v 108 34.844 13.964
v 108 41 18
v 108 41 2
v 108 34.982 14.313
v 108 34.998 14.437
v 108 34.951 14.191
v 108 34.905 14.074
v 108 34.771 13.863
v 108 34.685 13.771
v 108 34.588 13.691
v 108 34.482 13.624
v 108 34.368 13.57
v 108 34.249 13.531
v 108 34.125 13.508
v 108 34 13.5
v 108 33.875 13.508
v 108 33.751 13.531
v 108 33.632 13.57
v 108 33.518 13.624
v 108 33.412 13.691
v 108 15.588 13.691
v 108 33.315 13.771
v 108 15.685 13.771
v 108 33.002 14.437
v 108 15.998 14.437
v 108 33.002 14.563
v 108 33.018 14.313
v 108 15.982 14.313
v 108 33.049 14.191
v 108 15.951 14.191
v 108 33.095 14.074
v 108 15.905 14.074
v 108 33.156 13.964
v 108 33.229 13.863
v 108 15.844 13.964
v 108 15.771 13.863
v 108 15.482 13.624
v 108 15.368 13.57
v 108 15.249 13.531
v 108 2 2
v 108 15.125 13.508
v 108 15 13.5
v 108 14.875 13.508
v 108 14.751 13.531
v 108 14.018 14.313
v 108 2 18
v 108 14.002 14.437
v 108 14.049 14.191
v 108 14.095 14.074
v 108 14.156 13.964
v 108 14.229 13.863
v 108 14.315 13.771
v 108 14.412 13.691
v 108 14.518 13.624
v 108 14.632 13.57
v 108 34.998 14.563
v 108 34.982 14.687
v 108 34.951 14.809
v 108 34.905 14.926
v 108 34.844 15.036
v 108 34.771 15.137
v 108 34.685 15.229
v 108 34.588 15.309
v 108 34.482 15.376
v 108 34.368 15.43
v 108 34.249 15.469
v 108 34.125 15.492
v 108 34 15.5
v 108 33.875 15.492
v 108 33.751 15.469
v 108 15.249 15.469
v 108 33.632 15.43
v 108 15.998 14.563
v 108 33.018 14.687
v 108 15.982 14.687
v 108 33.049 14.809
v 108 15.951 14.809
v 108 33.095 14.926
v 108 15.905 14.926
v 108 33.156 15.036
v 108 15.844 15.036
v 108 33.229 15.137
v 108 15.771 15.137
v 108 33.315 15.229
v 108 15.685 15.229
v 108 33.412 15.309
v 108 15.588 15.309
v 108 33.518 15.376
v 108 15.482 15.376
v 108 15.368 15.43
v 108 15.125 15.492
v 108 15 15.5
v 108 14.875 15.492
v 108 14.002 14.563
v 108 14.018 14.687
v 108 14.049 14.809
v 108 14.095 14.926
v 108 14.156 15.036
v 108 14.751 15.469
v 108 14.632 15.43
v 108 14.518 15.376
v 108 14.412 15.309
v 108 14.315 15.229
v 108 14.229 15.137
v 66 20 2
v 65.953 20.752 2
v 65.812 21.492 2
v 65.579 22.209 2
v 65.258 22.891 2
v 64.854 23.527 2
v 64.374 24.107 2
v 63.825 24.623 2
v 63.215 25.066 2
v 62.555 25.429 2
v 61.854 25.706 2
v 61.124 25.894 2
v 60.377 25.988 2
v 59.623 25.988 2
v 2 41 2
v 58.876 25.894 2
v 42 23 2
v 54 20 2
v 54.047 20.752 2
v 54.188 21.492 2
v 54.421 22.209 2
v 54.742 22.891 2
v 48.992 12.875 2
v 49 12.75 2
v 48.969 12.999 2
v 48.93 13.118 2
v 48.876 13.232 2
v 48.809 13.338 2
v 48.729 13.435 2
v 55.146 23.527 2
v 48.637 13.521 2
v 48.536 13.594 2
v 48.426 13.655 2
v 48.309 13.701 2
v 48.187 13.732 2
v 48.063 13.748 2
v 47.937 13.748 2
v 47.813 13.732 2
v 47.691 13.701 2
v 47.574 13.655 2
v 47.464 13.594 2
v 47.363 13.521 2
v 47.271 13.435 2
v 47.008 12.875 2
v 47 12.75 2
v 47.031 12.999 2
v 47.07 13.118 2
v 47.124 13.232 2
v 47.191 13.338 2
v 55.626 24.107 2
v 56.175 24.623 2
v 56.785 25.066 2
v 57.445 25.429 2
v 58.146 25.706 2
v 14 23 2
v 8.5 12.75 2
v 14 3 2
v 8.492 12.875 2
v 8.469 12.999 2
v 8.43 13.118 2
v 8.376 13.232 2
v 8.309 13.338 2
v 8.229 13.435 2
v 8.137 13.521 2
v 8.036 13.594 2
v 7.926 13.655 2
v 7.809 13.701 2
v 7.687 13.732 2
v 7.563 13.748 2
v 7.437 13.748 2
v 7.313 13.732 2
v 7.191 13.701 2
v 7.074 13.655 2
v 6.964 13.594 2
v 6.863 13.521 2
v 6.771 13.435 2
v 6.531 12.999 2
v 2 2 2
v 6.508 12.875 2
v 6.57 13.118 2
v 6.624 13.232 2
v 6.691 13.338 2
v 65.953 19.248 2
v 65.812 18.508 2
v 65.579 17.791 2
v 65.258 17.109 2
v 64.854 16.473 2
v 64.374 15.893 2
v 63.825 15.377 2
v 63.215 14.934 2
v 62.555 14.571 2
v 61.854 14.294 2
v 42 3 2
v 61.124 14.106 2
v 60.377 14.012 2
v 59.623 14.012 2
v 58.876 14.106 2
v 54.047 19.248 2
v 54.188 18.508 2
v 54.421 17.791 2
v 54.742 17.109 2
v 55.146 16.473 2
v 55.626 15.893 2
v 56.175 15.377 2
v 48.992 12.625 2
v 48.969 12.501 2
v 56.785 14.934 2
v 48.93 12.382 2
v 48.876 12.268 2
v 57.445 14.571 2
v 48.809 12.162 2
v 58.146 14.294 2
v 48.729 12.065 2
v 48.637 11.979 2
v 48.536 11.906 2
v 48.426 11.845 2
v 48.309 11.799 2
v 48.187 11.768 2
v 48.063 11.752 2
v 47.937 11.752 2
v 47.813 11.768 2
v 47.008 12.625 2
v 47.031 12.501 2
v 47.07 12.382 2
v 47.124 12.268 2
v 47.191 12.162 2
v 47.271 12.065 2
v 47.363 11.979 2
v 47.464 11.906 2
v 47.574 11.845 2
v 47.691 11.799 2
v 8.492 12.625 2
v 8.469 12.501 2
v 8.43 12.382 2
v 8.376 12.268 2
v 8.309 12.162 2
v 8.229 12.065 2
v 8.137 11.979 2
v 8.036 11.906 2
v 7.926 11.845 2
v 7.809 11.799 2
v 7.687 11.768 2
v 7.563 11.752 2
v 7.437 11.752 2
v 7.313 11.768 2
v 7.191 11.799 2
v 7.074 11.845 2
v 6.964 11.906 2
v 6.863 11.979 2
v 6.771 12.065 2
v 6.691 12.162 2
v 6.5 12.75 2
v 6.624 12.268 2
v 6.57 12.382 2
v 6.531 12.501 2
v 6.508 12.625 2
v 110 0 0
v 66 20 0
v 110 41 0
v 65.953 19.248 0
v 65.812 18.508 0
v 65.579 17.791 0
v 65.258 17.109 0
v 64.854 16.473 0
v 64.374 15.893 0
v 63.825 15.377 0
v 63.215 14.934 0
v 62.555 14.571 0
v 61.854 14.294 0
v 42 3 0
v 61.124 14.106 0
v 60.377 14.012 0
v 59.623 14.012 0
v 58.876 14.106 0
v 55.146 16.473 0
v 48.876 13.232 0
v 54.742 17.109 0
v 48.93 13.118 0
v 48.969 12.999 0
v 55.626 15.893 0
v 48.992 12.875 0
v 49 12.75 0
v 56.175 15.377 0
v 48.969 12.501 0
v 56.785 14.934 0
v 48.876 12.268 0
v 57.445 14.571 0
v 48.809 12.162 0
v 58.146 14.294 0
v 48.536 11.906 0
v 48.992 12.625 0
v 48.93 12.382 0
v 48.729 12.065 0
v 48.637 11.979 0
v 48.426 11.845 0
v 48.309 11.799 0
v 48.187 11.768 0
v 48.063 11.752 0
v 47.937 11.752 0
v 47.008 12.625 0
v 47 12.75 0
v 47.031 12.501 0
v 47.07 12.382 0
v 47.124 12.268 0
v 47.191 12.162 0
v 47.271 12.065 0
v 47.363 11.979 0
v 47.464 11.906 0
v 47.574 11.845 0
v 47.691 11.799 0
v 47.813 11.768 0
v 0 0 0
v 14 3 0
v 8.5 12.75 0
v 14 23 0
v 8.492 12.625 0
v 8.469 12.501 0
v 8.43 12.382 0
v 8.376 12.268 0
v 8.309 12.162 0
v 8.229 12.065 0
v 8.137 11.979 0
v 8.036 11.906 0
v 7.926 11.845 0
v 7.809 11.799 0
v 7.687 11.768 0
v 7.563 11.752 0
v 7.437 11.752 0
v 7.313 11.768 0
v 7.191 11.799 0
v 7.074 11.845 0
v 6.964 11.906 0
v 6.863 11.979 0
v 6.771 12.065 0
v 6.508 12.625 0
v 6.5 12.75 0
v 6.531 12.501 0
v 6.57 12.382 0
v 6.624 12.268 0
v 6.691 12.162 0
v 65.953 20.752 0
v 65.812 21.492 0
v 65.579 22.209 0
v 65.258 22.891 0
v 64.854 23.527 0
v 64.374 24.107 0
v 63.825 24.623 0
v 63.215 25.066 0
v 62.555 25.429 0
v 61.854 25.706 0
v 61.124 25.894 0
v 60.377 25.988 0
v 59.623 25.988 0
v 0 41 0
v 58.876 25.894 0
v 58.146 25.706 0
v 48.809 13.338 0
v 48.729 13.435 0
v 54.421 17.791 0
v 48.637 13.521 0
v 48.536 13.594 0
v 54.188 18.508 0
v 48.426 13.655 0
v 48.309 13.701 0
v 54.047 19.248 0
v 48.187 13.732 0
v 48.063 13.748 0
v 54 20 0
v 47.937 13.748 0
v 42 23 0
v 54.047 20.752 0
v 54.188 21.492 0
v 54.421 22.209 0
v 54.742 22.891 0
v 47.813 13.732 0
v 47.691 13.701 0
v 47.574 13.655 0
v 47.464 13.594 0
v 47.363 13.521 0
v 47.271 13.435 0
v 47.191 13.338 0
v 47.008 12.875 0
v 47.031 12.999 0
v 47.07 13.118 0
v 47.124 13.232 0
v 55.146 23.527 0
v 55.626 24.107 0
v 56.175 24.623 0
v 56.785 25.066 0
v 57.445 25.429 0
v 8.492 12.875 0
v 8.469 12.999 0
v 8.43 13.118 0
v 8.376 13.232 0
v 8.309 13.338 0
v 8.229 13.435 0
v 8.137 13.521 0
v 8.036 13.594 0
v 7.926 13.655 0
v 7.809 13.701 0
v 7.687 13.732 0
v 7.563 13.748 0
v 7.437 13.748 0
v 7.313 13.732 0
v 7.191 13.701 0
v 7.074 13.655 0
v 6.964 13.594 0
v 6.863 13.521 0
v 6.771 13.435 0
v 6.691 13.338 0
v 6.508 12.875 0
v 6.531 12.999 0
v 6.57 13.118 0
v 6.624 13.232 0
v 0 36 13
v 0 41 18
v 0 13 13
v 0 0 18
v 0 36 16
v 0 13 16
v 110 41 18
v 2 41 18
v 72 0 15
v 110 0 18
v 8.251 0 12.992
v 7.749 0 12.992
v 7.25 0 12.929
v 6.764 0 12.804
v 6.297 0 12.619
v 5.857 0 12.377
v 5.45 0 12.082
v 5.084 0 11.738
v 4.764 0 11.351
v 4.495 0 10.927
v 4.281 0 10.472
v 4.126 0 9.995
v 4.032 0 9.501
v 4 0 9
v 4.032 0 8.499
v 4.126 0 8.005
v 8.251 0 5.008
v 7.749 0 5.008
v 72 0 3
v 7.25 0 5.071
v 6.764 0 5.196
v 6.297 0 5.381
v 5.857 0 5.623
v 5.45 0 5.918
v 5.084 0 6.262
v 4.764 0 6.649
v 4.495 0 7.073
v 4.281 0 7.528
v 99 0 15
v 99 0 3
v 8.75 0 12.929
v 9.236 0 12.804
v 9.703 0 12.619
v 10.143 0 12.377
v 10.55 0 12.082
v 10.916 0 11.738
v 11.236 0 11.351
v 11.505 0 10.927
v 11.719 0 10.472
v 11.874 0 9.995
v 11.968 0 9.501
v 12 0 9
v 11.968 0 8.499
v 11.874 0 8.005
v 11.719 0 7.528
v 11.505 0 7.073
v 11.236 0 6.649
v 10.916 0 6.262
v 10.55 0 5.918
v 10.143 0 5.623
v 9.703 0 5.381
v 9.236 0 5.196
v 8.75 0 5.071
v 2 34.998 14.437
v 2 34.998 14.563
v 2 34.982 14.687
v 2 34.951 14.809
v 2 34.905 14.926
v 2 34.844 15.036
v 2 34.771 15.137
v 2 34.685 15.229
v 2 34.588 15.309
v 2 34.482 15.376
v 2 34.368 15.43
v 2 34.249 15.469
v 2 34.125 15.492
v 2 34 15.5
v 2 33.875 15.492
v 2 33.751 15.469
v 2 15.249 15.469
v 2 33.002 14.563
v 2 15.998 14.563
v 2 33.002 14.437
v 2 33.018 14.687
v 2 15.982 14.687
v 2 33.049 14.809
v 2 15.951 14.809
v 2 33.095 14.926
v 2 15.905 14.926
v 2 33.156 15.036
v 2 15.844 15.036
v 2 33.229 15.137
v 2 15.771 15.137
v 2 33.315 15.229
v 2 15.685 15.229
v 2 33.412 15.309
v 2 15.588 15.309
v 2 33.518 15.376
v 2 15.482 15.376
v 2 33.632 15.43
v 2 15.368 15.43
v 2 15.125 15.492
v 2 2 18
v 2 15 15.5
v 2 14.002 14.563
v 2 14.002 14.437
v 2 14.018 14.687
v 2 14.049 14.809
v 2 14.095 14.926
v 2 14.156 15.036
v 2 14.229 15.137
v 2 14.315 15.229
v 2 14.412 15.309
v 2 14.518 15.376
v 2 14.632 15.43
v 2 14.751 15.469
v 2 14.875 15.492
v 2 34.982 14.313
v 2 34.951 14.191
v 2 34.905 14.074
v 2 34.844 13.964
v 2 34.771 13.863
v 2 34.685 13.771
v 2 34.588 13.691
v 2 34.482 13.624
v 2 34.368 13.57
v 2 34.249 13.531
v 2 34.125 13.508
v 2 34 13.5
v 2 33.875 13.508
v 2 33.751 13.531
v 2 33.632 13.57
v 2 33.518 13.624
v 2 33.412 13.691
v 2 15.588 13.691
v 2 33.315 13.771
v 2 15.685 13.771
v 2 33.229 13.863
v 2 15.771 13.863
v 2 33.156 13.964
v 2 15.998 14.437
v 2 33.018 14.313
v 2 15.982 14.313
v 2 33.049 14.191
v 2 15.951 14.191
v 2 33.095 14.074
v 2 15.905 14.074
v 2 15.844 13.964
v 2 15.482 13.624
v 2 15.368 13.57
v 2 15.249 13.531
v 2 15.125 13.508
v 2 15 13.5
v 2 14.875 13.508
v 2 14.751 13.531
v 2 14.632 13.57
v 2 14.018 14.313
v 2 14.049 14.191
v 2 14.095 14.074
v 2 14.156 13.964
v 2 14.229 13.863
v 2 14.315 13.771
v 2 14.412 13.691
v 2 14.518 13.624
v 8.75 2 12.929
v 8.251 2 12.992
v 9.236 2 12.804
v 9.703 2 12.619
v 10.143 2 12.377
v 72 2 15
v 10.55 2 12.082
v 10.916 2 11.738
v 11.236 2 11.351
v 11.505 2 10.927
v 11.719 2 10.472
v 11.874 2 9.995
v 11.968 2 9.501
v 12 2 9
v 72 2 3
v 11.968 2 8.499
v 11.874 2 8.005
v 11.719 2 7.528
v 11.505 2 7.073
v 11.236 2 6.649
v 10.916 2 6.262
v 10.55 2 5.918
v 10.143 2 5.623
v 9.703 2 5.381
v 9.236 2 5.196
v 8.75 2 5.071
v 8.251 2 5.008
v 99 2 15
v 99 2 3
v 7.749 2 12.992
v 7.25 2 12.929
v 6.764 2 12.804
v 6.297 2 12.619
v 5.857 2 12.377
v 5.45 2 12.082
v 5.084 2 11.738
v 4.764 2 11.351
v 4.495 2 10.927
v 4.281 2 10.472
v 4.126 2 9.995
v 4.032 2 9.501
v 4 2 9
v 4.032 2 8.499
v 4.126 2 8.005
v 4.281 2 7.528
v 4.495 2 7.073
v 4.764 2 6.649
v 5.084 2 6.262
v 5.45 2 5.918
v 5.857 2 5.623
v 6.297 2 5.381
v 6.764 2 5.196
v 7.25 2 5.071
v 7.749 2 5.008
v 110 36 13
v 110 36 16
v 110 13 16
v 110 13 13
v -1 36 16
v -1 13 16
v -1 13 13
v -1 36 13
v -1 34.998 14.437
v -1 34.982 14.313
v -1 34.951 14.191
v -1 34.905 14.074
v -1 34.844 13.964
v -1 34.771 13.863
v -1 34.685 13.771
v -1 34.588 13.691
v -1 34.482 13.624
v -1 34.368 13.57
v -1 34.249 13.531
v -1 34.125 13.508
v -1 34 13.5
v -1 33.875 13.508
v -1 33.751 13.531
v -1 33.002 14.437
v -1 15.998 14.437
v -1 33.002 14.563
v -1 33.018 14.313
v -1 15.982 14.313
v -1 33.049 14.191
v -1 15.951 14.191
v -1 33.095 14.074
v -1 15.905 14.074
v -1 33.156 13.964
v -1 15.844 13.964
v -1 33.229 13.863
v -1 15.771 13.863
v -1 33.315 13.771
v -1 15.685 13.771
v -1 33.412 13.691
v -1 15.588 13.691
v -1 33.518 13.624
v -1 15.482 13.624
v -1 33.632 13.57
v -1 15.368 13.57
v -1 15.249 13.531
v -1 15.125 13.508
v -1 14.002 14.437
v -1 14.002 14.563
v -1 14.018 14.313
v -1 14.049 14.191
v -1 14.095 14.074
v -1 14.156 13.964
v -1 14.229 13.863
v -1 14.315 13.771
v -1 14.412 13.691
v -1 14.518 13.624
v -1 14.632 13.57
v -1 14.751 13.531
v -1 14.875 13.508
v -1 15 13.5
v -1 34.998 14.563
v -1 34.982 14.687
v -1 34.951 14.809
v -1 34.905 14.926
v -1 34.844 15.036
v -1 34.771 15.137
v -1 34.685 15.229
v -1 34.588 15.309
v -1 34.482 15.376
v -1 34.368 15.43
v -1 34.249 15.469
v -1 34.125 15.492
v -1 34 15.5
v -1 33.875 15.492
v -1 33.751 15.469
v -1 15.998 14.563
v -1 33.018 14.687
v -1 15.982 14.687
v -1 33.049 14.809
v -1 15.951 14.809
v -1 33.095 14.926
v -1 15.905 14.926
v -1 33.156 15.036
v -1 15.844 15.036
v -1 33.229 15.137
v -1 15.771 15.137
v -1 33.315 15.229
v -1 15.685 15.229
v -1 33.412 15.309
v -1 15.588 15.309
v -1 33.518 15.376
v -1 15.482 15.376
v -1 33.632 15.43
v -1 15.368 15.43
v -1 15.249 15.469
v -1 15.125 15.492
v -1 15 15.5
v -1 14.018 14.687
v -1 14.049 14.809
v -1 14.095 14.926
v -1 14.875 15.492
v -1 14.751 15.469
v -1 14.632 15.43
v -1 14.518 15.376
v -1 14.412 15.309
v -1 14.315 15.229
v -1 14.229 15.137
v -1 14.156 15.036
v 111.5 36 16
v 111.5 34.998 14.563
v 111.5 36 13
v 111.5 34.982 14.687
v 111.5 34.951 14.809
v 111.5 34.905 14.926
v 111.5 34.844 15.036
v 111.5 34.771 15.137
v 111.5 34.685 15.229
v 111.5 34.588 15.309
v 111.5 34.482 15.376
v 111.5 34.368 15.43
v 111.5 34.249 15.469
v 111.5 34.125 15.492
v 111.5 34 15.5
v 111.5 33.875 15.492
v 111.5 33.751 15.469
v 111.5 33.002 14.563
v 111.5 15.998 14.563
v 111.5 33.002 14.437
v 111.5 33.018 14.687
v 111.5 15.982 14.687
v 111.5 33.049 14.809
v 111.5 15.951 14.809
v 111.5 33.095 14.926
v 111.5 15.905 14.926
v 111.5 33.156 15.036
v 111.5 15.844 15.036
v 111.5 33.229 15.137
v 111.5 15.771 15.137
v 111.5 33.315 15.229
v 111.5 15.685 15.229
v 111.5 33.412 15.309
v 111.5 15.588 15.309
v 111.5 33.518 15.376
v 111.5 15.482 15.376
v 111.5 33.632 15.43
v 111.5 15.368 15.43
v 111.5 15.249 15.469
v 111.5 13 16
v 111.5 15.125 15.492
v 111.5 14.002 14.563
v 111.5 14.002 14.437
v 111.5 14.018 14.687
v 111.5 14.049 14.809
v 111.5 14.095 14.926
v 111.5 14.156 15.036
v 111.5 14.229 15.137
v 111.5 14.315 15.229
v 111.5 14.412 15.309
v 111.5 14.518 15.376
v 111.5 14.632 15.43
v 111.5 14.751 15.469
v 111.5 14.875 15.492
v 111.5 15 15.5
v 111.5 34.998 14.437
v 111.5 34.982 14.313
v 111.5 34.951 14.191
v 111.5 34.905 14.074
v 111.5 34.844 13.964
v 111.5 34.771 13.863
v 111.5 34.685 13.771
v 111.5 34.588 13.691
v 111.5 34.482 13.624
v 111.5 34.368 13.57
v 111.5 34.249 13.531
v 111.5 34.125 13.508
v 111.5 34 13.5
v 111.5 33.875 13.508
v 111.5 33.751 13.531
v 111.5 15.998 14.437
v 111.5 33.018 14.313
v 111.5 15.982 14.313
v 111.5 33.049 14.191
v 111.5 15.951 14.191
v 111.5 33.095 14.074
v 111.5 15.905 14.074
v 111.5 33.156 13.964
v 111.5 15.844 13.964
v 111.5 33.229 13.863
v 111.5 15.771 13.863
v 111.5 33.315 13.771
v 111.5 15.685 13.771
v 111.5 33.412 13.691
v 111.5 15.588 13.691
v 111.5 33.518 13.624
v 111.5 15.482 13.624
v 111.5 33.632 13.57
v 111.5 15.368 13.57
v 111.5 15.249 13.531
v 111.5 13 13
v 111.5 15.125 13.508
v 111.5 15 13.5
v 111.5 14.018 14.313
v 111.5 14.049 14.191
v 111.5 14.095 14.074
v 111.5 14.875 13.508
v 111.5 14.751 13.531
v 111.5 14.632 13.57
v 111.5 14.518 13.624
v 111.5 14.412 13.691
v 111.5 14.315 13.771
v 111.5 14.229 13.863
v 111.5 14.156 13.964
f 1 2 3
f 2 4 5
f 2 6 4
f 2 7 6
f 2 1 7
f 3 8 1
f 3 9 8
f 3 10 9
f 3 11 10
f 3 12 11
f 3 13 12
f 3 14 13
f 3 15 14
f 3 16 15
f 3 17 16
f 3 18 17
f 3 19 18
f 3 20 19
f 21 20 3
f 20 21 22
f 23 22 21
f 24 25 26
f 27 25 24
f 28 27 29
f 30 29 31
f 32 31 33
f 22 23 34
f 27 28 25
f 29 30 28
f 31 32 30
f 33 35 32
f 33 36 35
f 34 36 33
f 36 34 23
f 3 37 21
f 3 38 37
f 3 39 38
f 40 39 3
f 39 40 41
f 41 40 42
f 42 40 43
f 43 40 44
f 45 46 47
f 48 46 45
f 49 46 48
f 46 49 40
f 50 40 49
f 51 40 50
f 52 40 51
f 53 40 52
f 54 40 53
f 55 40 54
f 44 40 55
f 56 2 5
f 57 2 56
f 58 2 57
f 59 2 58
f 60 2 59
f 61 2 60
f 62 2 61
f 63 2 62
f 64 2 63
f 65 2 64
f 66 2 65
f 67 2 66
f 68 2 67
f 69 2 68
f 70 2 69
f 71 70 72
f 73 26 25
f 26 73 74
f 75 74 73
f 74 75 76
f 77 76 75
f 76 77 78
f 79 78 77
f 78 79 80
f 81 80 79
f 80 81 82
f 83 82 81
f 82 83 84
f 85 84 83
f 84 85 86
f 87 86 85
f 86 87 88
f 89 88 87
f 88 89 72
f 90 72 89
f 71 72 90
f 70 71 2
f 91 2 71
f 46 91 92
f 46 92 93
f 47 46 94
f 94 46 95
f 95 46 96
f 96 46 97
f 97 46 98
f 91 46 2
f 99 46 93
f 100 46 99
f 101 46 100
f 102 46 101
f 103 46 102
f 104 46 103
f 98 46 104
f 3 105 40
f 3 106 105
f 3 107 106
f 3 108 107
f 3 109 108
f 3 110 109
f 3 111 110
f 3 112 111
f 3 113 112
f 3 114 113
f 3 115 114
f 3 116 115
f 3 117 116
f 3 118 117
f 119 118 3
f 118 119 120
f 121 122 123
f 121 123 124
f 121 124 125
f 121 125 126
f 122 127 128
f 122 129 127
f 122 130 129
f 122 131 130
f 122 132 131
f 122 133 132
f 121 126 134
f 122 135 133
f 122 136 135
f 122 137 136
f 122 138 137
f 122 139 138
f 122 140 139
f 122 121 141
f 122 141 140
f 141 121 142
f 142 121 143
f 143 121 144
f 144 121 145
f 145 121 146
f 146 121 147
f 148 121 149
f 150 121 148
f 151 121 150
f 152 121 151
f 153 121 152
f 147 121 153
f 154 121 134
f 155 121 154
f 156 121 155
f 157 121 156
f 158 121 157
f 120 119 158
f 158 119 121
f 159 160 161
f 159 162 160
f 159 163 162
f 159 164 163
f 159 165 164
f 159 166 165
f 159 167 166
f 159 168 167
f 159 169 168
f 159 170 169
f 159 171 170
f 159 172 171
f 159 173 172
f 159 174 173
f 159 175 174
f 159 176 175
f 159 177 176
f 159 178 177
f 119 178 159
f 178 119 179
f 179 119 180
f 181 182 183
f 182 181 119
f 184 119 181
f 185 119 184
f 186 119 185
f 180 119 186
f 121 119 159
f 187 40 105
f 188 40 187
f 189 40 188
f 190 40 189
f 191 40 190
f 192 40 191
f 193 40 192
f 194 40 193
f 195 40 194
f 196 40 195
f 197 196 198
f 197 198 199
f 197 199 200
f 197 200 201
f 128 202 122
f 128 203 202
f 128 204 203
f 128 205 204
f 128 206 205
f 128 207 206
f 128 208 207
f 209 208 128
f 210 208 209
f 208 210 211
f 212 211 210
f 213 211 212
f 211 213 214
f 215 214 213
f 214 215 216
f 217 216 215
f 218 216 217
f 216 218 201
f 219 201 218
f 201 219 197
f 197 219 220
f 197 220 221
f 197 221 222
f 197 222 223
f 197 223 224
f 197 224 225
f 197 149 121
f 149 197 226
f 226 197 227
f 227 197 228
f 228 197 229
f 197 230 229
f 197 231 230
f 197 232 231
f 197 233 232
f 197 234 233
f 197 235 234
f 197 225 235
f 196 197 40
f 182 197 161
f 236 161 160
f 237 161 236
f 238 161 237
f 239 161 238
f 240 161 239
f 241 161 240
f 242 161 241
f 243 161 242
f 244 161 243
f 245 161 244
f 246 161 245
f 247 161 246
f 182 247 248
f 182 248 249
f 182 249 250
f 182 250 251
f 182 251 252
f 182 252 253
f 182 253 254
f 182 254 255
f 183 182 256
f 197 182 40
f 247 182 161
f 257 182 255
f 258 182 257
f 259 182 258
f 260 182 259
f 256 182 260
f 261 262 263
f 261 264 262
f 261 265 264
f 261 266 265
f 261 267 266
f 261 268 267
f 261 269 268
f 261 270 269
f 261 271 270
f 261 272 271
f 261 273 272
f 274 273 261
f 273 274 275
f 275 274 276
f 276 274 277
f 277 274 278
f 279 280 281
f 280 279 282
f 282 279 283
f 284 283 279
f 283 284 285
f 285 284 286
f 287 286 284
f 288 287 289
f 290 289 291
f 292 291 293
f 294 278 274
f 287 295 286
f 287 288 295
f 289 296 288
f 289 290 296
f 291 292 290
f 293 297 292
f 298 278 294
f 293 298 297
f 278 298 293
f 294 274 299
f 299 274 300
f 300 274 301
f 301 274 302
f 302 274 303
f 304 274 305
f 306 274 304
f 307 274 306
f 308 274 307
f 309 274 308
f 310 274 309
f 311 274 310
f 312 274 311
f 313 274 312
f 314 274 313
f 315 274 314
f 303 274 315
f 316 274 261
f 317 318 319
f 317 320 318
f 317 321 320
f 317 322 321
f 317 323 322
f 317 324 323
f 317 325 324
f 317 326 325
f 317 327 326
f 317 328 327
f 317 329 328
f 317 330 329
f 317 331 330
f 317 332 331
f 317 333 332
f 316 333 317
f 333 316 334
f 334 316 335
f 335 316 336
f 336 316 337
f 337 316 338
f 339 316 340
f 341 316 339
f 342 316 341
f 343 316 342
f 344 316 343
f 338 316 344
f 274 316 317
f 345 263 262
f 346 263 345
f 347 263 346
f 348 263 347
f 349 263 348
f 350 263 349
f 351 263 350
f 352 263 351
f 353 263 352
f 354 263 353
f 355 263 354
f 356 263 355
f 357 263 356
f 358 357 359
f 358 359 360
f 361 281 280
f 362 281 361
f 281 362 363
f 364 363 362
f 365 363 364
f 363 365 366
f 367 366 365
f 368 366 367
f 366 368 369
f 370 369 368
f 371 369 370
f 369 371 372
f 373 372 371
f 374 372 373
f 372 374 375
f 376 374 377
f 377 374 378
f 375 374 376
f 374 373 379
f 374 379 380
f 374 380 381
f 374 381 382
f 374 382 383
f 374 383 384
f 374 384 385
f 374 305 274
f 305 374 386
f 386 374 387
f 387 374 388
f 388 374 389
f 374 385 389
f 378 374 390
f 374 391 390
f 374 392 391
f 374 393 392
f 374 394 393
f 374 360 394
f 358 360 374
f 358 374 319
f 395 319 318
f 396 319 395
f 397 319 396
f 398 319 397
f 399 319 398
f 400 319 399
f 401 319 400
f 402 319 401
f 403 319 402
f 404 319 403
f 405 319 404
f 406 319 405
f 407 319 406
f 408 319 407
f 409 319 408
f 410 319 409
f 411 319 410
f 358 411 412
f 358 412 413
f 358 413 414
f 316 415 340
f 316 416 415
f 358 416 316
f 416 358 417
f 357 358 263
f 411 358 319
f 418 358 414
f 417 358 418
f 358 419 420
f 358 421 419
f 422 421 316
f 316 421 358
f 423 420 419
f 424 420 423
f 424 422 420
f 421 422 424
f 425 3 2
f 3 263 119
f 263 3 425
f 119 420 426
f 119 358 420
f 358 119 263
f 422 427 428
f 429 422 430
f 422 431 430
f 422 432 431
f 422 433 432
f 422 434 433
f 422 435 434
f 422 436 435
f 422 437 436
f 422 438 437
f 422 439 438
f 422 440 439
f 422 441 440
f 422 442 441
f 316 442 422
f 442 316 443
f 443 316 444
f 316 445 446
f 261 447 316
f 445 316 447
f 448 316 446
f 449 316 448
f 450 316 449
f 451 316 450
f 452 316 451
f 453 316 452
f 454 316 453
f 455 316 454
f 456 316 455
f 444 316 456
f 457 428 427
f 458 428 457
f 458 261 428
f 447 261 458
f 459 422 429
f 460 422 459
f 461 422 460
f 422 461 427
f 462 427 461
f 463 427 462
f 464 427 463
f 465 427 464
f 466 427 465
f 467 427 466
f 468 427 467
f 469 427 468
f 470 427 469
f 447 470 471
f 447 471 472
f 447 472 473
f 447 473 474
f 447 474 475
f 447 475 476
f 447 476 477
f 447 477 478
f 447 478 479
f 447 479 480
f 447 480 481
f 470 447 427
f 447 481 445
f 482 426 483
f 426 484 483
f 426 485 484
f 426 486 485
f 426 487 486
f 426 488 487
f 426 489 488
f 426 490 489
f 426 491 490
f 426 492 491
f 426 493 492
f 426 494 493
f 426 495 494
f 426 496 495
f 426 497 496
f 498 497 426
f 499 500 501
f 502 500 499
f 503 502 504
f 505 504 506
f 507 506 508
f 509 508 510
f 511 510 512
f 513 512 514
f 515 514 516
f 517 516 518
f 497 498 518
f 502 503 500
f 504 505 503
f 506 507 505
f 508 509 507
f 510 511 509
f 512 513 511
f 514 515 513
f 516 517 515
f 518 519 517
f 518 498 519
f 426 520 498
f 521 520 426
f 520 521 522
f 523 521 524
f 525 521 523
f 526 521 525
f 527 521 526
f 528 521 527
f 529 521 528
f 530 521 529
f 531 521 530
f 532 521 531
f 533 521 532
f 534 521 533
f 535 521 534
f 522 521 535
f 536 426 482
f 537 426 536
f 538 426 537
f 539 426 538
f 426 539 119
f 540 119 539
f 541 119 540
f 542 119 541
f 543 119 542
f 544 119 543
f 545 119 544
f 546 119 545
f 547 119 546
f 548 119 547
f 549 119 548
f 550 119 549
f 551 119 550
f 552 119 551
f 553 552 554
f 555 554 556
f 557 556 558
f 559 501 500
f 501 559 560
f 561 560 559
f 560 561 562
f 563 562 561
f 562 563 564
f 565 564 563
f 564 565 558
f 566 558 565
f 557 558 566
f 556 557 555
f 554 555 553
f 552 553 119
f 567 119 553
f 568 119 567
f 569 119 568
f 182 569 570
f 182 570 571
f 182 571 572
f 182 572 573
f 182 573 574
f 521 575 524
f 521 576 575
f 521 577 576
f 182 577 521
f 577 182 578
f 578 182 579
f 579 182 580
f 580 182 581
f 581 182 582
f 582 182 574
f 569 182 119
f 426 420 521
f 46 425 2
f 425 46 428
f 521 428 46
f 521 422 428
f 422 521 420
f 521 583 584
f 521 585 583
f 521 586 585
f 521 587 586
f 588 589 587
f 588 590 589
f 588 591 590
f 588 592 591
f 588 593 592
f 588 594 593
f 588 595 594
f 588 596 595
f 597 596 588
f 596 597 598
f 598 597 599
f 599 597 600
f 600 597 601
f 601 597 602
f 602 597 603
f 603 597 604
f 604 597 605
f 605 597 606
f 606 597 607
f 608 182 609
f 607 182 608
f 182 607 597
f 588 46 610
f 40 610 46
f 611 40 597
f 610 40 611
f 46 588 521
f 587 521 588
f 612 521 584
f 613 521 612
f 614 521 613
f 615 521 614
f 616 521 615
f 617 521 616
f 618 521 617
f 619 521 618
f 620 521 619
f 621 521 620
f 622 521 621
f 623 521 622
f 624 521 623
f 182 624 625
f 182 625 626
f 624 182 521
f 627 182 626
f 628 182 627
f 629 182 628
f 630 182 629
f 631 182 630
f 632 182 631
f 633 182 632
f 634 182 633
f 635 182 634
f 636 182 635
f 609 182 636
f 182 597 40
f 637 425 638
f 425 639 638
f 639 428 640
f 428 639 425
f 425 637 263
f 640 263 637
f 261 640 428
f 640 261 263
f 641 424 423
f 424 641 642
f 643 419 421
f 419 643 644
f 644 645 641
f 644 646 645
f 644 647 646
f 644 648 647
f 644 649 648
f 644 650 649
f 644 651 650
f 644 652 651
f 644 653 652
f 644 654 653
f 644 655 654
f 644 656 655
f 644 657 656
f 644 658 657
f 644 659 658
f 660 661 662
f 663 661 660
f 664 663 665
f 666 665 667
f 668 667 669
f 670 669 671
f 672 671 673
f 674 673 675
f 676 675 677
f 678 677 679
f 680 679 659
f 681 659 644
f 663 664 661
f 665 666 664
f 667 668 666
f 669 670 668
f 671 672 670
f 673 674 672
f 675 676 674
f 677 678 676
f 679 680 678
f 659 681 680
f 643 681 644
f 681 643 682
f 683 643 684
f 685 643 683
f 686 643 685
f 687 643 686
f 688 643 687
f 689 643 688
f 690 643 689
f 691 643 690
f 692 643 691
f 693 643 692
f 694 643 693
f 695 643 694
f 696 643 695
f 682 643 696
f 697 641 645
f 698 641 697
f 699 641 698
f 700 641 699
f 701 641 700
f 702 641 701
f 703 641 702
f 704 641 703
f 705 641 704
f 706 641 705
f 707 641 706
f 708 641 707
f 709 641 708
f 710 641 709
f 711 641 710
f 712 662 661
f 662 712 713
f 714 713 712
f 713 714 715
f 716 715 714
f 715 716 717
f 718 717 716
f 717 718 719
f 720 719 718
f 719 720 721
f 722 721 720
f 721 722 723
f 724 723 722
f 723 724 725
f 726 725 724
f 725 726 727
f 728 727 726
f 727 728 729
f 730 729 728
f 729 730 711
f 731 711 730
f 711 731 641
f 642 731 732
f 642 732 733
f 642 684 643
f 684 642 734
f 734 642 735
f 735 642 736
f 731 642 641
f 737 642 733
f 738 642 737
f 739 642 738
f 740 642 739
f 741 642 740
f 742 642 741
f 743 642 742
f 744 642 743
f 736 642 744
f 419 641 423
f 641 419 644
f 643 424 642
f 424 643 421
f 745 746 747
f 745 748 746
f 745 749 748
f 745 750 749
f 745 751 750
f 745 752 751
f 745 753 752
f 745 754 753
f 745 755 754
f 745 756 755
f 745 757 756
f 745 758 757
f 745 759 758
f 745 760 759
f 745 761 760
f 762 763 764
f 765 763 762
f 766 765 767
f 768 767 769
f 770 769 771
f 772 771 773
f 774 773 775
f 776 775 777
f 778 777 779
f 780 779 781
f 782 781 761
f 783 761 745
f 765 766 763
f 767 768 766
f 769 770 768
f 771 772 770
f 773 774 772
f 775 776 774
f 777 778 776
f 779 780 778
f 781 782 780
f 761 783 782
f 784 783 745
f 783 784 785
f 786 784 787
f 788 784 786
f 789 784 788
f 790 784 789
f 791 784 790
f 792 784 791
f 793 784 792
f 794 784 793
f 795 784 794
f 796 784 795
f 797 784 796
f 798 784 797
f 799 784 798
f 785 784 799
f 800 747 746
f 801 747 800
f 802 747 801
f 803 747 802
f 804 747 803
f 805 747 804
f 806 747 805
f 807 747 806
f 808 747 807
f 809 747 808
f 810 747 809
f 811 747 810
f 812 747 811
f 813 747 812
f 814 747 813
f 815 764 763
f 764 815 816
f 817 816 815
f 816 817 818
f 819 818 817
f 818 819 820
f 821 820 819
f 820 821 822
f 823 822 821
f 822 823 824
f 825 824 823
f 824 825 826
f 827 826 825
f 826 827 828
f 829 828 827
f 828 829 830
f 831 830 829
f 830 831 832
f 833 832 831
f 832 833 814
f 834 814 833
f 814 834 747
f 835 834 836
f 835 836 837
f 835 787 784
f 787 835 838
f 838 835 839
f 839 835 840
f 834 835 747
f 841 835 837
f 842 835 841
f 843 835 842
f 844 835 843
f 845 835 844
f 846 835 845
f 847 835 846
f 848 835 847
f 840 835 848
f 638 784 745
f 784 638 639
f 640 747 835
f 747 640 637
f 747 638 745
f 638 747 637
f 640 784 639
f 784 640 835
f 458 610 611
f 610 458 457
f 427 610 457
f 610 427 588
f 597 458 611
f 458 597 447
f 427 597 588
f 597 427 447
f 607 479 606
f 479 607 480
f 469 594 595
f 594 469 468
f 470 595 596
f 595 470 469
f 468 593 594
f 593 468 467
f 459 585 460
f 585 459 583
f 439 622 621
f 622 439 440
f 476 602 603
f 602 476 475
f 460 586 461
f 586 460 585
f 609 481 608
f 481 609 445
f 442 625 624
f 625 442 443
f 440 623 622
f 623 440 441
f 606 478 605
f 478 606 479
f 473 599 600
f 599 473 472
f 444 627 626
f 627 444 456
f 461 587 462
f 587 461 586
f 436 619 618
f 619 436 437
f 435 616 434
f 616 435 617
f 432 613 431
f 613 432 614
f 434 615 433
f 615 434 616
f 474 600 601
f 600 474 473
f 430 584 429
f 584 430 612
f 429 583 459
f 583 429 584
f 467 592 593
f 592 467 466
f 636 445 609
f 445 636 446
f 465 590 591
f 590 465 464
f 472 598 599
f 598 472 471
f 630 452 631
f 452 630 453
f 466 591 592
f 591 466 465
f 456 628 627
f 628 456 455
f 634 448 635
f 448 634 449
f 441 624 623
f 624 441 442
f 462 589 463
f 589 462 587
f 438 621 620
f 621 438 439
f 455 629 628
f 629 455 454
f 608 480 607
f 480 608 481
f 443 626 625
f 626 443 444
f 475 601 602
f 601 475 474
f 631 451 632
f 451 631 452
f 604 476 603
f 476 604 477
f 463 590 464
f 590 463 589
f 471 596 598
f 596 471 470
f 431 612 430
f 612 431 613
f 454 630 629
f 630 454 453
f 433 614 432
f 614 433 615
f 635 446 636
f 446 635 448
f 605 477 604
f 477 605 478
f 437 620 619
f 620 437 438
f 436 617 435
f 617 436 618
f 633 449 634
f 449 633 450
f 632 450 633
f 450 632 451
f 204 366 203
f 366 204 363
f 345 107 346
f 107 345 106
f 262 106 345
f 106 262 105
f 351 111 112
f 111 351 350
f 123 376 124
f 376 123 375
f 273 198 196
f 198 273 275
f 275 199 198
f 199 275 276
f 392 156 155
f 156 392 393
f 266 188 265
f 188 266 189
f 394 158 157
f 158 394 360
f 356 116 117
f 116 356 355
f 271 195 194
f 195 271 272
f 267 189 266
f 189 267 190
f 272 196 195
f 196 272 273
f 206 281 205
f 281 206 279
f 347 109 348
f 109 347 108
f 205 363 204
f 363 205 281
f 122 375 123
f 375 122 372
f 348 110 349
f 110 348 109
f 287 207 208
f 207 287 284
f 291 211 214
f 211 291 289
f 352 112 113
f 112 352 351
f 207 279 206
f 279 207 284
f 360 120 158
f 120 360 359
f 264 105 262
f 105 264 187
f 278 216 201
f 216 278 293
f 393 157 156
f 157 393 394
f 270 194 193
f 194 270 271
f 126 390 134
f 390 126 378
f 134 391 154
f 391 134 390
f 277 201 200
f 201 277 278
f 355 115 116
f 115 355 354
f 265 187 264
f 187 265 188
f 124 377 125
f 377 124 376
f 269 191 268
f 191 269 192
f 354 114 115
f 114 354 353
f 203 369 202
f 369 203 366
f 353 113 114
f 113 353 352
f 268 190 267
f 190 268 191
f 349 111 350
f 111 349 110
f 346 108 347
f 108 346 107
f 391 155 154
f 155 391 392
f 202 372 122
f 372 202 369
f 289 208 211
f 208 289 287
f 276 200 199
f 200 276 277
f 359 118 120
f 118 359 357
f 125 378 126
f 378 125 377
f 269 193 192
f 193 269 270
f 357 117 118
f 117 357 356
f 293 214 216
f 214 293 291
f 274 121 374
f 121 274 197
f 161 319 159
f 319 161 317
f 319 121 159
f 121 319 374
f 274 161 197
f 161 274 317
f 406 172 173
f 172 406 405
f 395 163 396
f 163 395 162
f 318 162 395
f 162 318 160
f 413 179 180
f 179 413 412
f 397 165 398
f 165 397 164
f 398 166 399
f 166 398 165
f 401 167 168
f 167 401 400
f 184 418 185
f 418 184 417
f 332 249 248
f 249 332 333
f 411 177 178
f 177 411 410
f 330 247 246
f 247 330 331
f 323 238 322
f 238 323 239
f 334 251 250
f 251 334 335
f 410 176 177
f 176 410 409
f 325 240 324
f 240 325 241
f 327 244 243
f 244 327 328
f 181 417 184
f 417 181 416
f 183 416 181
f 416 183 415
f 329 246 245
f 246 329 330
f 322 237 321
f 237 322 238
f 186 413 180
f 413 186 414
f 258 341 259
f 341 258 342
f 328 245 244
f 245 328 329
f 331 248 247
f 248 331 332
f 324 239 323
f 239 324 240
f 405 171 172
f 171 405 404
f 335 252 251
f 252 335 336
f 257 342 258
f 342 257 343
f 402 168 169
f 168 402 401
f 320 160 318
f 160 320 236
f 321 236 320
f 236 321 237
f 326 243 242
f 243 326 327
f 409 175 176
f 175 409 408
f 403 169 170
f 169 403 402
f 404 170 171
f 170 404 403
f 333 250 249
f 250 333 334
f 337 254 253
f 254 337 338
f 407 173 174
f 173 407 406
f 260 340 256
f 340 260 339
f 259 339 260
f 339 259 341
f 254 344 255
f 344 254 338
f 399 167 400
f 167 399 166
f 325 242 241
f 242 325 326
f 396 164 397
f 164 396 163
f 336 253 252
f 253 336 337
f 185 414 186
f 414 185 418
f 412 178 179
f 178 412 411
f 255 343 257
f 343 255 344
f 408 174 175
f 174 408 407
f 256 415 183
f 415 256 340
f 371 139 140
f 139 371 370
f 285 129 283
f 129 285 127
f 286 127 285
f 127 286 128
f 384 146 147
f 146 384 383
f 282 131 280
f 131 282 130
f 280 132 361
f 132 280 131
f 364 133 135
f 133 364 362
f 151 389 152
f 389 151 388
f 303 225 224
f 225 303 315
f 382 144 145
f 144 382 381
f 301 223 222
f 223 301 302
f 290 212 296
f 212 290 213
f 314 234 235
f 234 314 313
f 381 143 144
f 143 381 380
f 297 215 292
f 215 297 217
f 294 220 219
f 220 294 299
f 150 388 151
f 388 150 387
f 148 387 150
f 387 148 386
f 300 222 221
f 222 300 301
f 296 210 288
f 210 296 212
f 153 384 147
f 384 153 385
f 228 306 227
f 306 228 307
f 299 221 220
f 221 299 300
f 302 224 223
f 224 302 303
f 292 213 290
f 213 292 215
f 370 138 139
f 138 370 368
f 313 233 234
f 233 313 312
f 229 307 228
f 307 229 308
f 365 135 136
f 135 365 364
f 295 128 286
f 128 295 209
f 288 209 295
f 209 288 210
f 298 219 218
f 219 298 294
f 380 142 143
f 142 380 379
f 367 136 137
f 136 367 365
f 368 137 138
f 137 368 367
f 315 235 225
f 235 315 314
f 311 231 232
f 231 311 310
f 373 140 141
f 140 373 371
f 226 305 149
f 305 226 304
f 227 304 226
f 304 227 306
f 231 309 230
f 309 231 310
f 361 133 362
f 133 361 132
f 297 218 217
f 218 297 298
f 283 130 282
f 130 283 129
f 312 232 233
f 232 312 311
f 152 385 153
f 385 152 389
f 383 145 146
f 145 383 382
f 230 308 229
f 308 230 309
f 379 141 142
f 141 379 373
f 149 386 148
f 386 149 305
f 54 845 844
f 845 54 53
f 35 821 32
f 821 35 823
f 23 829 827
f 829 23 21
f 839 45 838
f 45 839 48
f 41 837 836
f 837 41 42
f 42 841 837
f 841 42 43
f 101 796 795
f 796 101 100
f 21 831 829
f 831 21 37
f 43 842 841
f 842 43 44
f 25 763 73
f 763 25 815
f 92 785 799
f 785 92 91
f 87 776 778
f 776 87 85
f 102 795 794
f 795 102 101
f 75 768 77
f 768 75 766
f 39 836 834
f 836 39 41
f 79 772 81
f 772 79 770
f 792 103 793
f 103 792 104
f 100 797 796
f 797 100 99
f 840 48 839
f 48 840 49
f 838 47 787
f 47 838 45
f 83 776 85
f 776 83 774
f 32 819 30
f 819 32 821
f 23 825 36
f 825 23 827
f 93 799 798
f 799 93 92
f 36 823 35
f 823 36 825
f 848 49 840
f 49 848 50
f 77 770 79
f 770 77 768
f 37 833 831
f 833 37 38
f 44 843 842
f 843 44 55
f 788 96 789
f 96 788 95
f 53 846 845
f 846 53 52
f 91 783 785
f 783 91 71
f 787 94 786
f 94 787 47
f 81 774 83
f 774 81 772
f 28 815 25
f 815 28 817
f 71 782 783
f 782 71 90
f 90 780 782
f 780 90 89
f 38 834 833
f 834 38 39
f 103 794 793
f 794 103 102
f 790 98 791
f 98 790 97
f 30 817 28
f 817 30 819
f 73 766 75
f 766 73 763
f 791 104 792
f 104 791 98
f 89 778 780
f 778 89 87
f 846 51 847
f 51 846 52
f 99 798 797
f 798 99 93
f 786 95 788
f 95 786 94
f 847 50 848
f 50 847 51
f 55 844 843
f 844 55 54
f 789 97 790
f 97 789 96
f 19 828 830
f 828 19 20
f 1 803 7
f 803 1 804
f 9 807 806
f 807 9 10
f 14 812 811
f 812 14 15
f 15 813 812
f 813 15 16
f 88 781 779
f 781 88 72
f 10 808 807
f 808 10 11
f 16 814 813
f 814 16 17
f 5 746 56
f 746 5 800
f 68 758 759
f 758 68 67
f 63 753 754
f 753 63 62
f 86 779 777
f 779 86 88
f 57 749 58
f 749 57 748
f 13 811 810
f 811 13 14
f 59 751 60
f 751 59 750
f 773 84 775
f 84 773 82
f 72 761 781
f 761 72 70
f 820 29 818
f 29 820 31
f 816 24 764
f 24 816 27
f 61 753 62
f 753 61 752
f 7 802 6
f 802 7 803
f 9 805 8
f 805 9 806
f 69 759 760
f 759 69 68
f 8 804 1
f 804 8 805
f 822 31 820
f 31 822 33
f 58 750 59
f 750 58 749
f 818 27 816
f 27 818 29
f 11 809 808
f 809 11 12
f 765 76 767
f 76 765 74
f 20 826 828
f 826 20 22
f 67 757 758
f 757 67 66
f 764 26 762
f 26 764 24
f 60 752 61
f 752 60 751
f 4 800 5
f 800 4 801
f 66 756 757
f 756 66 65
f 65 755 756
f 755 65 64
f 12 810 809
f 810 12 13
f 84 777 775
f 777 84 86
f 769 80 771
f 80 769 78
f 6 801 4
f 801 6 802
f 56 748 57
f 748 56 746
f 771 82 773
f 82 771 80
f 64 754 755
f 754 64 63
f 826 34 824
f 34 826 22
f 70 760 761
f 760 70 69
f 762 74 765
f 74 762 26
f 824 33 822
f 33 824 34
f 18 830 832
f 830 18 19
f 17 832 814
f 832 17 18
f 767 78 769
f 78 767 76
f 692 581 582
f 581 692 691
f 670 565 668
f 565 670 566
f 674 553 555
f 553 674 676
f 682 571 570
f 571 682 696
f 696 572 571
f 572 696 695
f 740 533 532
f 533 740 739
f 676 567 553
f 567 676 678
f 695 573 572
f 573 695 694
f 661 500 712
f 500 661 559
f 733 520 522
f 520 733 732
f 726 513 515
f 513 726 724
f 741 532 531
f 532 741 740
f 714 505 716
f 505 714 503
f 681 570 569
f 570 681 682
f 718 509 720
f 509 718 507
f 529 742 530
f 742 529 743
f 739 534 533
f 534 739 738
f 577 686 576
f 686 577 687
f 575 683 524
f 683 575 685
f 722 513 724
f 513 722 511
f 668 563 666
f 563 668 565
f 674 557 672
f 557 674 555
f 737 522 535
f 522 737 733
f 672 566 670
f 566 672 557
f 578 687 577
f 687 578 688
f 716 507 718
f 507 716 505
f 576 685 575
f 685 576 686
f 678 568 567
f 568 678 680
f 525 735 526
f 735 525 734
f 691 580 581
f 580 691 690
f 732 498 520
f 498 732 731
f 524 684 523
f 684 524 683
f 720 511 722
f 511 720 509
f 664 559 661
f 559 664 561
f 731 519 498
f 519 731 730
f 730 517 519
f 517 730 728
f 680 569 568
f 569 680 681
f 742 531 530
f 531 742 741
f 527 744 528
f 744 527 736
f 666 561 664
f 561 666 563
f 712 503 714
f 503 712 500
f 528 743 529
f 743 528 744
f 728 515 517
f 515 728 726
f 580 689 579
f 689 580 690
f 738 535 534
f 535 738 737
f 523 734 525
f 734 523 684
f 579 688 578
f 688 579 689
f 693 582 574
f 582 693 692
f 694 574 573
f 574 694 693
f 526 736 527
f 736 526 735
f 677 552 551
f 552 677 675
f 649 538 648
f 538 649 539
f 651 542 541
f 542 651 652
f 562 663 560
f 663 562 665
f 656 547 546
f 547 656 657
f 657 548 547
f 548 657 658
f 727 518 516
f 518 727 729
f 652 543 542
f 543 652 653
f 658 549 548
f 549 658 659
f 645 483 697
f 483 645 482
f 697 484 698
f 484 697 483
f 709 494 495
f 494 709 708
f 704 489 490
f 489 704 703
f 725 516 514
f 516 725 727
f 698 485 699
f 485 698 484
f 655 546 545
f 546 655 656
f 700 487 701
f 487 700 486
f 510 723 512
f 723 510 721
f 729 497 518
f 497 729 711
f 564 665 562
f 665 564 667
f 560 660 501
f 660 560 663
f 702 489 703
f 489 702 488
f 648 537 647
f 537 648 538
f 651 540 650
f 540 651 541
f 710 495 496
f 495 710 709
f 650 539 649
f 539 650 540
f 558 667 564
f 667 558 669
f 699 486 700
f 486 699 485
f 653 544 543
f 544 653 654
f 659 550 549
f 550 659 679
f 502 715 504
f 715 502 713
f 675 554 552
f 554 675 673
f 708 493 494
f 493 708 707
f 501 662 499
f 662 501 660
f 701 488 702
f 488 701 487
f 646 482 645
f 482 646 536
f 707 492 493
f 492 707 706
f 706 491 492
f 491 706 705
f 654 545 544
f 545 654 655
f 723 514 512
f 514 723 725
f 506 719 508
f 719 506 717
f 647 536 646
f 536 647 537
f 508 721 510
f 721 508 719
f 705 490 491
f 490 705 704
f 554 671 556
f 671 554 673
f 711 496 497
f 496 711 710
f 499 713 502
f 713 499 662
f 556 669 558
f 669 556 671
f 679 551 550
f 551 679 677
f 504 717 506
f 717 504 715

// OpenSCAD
/*************************************************************************************************
Power Supply Terminal Cover for the power supply commonly used with the Bukobot and other 3d printers
Author: Mike Thompson (thingiverse: mike_linus)
Date Last Modified: 11/03/2013 4:19pm
Description: simply change the cutout parameters to suit. Note: do not change length, height, depth and thickness parameters for the base unless you want to change the core dimensions.
**************************************************************************************************/

//***************************************************************
//don't change these base parameters unless you want to change the core dimensions.
//***************************************************************
hole_resolution=50;
base_length=108;
base_height=41;
base_depth=18;
base_thickness=2;
$fn=hole_resolution;

//***************************************************************
//change these cutout parameters to suit you own switch size etc.
//***************************************************************
switch_cutout_length=27;
switch_cutout_width=12;

led_cutout_radius=4;
grommet_cutout_radius=6;

power_plug_cutout_length=28;
power_plug_cutout_width=20;

screw_hole_cutout_radius=1;

module base(){
cube([base_length,base_height,base_thickness]);
cube([base_thickness,base_height,base_depth]);
cube([base_length,base_thickness,base_depth]);
translate([base_length,0,0])cube([base_thickness,base_height,base_depth]);
translate([-1,13,13])cube([1.5,23,3]);//slot retainer
translate([base_length+base_thickness,13,13])cube([1.5,23,3]);//slot retainer
}

difference(){
base();
translate([72,0,3])cube([switch_cutout_length,base_thickness,switch_cutout_width]);  //switch cutout
translate([8,3,9])rotate([90,0,0])cylinder(r=led_cutout_radius,h=5);  //led cutout
translate([60,20,0])cylinder(r=grommet_cutout_radius,h=5);  //12v lead cutout
translate([14,3,0])cube([power_plug_cutout_length,power_plug_cutout_width,base_thickness]);  //240v plug cutout
translate([7.5,12.75,0])cylinder(r=screw_hole_cutout_radius,h=5);  //240v plug screw hole
translate([48,12.75,0])cylinder(r=screw_hole_cutout_radius,h=5);  //240v plug screw hole
translate([base_length,15,14.5])rotate([0,90,0])cylinder(r=screw_hole_cutout_radius,h=5);  //retainer screw hole
translate([base_length,34,14.5])rotate([0,90,0])cylinder(r=screw_hole_cutout_radius,h=5);  //retainer screw hole
translate([-1,15,14.5])rotate([0,90,0])cylinder(r=screw_hole_cutout_radius,h=5);  //retainer screw hole
translate([-1,34,14.5])rotate([0,90,0])cylinder(r=screw_hole_cutout_radius,h=5);  //retainer screw hole
}
